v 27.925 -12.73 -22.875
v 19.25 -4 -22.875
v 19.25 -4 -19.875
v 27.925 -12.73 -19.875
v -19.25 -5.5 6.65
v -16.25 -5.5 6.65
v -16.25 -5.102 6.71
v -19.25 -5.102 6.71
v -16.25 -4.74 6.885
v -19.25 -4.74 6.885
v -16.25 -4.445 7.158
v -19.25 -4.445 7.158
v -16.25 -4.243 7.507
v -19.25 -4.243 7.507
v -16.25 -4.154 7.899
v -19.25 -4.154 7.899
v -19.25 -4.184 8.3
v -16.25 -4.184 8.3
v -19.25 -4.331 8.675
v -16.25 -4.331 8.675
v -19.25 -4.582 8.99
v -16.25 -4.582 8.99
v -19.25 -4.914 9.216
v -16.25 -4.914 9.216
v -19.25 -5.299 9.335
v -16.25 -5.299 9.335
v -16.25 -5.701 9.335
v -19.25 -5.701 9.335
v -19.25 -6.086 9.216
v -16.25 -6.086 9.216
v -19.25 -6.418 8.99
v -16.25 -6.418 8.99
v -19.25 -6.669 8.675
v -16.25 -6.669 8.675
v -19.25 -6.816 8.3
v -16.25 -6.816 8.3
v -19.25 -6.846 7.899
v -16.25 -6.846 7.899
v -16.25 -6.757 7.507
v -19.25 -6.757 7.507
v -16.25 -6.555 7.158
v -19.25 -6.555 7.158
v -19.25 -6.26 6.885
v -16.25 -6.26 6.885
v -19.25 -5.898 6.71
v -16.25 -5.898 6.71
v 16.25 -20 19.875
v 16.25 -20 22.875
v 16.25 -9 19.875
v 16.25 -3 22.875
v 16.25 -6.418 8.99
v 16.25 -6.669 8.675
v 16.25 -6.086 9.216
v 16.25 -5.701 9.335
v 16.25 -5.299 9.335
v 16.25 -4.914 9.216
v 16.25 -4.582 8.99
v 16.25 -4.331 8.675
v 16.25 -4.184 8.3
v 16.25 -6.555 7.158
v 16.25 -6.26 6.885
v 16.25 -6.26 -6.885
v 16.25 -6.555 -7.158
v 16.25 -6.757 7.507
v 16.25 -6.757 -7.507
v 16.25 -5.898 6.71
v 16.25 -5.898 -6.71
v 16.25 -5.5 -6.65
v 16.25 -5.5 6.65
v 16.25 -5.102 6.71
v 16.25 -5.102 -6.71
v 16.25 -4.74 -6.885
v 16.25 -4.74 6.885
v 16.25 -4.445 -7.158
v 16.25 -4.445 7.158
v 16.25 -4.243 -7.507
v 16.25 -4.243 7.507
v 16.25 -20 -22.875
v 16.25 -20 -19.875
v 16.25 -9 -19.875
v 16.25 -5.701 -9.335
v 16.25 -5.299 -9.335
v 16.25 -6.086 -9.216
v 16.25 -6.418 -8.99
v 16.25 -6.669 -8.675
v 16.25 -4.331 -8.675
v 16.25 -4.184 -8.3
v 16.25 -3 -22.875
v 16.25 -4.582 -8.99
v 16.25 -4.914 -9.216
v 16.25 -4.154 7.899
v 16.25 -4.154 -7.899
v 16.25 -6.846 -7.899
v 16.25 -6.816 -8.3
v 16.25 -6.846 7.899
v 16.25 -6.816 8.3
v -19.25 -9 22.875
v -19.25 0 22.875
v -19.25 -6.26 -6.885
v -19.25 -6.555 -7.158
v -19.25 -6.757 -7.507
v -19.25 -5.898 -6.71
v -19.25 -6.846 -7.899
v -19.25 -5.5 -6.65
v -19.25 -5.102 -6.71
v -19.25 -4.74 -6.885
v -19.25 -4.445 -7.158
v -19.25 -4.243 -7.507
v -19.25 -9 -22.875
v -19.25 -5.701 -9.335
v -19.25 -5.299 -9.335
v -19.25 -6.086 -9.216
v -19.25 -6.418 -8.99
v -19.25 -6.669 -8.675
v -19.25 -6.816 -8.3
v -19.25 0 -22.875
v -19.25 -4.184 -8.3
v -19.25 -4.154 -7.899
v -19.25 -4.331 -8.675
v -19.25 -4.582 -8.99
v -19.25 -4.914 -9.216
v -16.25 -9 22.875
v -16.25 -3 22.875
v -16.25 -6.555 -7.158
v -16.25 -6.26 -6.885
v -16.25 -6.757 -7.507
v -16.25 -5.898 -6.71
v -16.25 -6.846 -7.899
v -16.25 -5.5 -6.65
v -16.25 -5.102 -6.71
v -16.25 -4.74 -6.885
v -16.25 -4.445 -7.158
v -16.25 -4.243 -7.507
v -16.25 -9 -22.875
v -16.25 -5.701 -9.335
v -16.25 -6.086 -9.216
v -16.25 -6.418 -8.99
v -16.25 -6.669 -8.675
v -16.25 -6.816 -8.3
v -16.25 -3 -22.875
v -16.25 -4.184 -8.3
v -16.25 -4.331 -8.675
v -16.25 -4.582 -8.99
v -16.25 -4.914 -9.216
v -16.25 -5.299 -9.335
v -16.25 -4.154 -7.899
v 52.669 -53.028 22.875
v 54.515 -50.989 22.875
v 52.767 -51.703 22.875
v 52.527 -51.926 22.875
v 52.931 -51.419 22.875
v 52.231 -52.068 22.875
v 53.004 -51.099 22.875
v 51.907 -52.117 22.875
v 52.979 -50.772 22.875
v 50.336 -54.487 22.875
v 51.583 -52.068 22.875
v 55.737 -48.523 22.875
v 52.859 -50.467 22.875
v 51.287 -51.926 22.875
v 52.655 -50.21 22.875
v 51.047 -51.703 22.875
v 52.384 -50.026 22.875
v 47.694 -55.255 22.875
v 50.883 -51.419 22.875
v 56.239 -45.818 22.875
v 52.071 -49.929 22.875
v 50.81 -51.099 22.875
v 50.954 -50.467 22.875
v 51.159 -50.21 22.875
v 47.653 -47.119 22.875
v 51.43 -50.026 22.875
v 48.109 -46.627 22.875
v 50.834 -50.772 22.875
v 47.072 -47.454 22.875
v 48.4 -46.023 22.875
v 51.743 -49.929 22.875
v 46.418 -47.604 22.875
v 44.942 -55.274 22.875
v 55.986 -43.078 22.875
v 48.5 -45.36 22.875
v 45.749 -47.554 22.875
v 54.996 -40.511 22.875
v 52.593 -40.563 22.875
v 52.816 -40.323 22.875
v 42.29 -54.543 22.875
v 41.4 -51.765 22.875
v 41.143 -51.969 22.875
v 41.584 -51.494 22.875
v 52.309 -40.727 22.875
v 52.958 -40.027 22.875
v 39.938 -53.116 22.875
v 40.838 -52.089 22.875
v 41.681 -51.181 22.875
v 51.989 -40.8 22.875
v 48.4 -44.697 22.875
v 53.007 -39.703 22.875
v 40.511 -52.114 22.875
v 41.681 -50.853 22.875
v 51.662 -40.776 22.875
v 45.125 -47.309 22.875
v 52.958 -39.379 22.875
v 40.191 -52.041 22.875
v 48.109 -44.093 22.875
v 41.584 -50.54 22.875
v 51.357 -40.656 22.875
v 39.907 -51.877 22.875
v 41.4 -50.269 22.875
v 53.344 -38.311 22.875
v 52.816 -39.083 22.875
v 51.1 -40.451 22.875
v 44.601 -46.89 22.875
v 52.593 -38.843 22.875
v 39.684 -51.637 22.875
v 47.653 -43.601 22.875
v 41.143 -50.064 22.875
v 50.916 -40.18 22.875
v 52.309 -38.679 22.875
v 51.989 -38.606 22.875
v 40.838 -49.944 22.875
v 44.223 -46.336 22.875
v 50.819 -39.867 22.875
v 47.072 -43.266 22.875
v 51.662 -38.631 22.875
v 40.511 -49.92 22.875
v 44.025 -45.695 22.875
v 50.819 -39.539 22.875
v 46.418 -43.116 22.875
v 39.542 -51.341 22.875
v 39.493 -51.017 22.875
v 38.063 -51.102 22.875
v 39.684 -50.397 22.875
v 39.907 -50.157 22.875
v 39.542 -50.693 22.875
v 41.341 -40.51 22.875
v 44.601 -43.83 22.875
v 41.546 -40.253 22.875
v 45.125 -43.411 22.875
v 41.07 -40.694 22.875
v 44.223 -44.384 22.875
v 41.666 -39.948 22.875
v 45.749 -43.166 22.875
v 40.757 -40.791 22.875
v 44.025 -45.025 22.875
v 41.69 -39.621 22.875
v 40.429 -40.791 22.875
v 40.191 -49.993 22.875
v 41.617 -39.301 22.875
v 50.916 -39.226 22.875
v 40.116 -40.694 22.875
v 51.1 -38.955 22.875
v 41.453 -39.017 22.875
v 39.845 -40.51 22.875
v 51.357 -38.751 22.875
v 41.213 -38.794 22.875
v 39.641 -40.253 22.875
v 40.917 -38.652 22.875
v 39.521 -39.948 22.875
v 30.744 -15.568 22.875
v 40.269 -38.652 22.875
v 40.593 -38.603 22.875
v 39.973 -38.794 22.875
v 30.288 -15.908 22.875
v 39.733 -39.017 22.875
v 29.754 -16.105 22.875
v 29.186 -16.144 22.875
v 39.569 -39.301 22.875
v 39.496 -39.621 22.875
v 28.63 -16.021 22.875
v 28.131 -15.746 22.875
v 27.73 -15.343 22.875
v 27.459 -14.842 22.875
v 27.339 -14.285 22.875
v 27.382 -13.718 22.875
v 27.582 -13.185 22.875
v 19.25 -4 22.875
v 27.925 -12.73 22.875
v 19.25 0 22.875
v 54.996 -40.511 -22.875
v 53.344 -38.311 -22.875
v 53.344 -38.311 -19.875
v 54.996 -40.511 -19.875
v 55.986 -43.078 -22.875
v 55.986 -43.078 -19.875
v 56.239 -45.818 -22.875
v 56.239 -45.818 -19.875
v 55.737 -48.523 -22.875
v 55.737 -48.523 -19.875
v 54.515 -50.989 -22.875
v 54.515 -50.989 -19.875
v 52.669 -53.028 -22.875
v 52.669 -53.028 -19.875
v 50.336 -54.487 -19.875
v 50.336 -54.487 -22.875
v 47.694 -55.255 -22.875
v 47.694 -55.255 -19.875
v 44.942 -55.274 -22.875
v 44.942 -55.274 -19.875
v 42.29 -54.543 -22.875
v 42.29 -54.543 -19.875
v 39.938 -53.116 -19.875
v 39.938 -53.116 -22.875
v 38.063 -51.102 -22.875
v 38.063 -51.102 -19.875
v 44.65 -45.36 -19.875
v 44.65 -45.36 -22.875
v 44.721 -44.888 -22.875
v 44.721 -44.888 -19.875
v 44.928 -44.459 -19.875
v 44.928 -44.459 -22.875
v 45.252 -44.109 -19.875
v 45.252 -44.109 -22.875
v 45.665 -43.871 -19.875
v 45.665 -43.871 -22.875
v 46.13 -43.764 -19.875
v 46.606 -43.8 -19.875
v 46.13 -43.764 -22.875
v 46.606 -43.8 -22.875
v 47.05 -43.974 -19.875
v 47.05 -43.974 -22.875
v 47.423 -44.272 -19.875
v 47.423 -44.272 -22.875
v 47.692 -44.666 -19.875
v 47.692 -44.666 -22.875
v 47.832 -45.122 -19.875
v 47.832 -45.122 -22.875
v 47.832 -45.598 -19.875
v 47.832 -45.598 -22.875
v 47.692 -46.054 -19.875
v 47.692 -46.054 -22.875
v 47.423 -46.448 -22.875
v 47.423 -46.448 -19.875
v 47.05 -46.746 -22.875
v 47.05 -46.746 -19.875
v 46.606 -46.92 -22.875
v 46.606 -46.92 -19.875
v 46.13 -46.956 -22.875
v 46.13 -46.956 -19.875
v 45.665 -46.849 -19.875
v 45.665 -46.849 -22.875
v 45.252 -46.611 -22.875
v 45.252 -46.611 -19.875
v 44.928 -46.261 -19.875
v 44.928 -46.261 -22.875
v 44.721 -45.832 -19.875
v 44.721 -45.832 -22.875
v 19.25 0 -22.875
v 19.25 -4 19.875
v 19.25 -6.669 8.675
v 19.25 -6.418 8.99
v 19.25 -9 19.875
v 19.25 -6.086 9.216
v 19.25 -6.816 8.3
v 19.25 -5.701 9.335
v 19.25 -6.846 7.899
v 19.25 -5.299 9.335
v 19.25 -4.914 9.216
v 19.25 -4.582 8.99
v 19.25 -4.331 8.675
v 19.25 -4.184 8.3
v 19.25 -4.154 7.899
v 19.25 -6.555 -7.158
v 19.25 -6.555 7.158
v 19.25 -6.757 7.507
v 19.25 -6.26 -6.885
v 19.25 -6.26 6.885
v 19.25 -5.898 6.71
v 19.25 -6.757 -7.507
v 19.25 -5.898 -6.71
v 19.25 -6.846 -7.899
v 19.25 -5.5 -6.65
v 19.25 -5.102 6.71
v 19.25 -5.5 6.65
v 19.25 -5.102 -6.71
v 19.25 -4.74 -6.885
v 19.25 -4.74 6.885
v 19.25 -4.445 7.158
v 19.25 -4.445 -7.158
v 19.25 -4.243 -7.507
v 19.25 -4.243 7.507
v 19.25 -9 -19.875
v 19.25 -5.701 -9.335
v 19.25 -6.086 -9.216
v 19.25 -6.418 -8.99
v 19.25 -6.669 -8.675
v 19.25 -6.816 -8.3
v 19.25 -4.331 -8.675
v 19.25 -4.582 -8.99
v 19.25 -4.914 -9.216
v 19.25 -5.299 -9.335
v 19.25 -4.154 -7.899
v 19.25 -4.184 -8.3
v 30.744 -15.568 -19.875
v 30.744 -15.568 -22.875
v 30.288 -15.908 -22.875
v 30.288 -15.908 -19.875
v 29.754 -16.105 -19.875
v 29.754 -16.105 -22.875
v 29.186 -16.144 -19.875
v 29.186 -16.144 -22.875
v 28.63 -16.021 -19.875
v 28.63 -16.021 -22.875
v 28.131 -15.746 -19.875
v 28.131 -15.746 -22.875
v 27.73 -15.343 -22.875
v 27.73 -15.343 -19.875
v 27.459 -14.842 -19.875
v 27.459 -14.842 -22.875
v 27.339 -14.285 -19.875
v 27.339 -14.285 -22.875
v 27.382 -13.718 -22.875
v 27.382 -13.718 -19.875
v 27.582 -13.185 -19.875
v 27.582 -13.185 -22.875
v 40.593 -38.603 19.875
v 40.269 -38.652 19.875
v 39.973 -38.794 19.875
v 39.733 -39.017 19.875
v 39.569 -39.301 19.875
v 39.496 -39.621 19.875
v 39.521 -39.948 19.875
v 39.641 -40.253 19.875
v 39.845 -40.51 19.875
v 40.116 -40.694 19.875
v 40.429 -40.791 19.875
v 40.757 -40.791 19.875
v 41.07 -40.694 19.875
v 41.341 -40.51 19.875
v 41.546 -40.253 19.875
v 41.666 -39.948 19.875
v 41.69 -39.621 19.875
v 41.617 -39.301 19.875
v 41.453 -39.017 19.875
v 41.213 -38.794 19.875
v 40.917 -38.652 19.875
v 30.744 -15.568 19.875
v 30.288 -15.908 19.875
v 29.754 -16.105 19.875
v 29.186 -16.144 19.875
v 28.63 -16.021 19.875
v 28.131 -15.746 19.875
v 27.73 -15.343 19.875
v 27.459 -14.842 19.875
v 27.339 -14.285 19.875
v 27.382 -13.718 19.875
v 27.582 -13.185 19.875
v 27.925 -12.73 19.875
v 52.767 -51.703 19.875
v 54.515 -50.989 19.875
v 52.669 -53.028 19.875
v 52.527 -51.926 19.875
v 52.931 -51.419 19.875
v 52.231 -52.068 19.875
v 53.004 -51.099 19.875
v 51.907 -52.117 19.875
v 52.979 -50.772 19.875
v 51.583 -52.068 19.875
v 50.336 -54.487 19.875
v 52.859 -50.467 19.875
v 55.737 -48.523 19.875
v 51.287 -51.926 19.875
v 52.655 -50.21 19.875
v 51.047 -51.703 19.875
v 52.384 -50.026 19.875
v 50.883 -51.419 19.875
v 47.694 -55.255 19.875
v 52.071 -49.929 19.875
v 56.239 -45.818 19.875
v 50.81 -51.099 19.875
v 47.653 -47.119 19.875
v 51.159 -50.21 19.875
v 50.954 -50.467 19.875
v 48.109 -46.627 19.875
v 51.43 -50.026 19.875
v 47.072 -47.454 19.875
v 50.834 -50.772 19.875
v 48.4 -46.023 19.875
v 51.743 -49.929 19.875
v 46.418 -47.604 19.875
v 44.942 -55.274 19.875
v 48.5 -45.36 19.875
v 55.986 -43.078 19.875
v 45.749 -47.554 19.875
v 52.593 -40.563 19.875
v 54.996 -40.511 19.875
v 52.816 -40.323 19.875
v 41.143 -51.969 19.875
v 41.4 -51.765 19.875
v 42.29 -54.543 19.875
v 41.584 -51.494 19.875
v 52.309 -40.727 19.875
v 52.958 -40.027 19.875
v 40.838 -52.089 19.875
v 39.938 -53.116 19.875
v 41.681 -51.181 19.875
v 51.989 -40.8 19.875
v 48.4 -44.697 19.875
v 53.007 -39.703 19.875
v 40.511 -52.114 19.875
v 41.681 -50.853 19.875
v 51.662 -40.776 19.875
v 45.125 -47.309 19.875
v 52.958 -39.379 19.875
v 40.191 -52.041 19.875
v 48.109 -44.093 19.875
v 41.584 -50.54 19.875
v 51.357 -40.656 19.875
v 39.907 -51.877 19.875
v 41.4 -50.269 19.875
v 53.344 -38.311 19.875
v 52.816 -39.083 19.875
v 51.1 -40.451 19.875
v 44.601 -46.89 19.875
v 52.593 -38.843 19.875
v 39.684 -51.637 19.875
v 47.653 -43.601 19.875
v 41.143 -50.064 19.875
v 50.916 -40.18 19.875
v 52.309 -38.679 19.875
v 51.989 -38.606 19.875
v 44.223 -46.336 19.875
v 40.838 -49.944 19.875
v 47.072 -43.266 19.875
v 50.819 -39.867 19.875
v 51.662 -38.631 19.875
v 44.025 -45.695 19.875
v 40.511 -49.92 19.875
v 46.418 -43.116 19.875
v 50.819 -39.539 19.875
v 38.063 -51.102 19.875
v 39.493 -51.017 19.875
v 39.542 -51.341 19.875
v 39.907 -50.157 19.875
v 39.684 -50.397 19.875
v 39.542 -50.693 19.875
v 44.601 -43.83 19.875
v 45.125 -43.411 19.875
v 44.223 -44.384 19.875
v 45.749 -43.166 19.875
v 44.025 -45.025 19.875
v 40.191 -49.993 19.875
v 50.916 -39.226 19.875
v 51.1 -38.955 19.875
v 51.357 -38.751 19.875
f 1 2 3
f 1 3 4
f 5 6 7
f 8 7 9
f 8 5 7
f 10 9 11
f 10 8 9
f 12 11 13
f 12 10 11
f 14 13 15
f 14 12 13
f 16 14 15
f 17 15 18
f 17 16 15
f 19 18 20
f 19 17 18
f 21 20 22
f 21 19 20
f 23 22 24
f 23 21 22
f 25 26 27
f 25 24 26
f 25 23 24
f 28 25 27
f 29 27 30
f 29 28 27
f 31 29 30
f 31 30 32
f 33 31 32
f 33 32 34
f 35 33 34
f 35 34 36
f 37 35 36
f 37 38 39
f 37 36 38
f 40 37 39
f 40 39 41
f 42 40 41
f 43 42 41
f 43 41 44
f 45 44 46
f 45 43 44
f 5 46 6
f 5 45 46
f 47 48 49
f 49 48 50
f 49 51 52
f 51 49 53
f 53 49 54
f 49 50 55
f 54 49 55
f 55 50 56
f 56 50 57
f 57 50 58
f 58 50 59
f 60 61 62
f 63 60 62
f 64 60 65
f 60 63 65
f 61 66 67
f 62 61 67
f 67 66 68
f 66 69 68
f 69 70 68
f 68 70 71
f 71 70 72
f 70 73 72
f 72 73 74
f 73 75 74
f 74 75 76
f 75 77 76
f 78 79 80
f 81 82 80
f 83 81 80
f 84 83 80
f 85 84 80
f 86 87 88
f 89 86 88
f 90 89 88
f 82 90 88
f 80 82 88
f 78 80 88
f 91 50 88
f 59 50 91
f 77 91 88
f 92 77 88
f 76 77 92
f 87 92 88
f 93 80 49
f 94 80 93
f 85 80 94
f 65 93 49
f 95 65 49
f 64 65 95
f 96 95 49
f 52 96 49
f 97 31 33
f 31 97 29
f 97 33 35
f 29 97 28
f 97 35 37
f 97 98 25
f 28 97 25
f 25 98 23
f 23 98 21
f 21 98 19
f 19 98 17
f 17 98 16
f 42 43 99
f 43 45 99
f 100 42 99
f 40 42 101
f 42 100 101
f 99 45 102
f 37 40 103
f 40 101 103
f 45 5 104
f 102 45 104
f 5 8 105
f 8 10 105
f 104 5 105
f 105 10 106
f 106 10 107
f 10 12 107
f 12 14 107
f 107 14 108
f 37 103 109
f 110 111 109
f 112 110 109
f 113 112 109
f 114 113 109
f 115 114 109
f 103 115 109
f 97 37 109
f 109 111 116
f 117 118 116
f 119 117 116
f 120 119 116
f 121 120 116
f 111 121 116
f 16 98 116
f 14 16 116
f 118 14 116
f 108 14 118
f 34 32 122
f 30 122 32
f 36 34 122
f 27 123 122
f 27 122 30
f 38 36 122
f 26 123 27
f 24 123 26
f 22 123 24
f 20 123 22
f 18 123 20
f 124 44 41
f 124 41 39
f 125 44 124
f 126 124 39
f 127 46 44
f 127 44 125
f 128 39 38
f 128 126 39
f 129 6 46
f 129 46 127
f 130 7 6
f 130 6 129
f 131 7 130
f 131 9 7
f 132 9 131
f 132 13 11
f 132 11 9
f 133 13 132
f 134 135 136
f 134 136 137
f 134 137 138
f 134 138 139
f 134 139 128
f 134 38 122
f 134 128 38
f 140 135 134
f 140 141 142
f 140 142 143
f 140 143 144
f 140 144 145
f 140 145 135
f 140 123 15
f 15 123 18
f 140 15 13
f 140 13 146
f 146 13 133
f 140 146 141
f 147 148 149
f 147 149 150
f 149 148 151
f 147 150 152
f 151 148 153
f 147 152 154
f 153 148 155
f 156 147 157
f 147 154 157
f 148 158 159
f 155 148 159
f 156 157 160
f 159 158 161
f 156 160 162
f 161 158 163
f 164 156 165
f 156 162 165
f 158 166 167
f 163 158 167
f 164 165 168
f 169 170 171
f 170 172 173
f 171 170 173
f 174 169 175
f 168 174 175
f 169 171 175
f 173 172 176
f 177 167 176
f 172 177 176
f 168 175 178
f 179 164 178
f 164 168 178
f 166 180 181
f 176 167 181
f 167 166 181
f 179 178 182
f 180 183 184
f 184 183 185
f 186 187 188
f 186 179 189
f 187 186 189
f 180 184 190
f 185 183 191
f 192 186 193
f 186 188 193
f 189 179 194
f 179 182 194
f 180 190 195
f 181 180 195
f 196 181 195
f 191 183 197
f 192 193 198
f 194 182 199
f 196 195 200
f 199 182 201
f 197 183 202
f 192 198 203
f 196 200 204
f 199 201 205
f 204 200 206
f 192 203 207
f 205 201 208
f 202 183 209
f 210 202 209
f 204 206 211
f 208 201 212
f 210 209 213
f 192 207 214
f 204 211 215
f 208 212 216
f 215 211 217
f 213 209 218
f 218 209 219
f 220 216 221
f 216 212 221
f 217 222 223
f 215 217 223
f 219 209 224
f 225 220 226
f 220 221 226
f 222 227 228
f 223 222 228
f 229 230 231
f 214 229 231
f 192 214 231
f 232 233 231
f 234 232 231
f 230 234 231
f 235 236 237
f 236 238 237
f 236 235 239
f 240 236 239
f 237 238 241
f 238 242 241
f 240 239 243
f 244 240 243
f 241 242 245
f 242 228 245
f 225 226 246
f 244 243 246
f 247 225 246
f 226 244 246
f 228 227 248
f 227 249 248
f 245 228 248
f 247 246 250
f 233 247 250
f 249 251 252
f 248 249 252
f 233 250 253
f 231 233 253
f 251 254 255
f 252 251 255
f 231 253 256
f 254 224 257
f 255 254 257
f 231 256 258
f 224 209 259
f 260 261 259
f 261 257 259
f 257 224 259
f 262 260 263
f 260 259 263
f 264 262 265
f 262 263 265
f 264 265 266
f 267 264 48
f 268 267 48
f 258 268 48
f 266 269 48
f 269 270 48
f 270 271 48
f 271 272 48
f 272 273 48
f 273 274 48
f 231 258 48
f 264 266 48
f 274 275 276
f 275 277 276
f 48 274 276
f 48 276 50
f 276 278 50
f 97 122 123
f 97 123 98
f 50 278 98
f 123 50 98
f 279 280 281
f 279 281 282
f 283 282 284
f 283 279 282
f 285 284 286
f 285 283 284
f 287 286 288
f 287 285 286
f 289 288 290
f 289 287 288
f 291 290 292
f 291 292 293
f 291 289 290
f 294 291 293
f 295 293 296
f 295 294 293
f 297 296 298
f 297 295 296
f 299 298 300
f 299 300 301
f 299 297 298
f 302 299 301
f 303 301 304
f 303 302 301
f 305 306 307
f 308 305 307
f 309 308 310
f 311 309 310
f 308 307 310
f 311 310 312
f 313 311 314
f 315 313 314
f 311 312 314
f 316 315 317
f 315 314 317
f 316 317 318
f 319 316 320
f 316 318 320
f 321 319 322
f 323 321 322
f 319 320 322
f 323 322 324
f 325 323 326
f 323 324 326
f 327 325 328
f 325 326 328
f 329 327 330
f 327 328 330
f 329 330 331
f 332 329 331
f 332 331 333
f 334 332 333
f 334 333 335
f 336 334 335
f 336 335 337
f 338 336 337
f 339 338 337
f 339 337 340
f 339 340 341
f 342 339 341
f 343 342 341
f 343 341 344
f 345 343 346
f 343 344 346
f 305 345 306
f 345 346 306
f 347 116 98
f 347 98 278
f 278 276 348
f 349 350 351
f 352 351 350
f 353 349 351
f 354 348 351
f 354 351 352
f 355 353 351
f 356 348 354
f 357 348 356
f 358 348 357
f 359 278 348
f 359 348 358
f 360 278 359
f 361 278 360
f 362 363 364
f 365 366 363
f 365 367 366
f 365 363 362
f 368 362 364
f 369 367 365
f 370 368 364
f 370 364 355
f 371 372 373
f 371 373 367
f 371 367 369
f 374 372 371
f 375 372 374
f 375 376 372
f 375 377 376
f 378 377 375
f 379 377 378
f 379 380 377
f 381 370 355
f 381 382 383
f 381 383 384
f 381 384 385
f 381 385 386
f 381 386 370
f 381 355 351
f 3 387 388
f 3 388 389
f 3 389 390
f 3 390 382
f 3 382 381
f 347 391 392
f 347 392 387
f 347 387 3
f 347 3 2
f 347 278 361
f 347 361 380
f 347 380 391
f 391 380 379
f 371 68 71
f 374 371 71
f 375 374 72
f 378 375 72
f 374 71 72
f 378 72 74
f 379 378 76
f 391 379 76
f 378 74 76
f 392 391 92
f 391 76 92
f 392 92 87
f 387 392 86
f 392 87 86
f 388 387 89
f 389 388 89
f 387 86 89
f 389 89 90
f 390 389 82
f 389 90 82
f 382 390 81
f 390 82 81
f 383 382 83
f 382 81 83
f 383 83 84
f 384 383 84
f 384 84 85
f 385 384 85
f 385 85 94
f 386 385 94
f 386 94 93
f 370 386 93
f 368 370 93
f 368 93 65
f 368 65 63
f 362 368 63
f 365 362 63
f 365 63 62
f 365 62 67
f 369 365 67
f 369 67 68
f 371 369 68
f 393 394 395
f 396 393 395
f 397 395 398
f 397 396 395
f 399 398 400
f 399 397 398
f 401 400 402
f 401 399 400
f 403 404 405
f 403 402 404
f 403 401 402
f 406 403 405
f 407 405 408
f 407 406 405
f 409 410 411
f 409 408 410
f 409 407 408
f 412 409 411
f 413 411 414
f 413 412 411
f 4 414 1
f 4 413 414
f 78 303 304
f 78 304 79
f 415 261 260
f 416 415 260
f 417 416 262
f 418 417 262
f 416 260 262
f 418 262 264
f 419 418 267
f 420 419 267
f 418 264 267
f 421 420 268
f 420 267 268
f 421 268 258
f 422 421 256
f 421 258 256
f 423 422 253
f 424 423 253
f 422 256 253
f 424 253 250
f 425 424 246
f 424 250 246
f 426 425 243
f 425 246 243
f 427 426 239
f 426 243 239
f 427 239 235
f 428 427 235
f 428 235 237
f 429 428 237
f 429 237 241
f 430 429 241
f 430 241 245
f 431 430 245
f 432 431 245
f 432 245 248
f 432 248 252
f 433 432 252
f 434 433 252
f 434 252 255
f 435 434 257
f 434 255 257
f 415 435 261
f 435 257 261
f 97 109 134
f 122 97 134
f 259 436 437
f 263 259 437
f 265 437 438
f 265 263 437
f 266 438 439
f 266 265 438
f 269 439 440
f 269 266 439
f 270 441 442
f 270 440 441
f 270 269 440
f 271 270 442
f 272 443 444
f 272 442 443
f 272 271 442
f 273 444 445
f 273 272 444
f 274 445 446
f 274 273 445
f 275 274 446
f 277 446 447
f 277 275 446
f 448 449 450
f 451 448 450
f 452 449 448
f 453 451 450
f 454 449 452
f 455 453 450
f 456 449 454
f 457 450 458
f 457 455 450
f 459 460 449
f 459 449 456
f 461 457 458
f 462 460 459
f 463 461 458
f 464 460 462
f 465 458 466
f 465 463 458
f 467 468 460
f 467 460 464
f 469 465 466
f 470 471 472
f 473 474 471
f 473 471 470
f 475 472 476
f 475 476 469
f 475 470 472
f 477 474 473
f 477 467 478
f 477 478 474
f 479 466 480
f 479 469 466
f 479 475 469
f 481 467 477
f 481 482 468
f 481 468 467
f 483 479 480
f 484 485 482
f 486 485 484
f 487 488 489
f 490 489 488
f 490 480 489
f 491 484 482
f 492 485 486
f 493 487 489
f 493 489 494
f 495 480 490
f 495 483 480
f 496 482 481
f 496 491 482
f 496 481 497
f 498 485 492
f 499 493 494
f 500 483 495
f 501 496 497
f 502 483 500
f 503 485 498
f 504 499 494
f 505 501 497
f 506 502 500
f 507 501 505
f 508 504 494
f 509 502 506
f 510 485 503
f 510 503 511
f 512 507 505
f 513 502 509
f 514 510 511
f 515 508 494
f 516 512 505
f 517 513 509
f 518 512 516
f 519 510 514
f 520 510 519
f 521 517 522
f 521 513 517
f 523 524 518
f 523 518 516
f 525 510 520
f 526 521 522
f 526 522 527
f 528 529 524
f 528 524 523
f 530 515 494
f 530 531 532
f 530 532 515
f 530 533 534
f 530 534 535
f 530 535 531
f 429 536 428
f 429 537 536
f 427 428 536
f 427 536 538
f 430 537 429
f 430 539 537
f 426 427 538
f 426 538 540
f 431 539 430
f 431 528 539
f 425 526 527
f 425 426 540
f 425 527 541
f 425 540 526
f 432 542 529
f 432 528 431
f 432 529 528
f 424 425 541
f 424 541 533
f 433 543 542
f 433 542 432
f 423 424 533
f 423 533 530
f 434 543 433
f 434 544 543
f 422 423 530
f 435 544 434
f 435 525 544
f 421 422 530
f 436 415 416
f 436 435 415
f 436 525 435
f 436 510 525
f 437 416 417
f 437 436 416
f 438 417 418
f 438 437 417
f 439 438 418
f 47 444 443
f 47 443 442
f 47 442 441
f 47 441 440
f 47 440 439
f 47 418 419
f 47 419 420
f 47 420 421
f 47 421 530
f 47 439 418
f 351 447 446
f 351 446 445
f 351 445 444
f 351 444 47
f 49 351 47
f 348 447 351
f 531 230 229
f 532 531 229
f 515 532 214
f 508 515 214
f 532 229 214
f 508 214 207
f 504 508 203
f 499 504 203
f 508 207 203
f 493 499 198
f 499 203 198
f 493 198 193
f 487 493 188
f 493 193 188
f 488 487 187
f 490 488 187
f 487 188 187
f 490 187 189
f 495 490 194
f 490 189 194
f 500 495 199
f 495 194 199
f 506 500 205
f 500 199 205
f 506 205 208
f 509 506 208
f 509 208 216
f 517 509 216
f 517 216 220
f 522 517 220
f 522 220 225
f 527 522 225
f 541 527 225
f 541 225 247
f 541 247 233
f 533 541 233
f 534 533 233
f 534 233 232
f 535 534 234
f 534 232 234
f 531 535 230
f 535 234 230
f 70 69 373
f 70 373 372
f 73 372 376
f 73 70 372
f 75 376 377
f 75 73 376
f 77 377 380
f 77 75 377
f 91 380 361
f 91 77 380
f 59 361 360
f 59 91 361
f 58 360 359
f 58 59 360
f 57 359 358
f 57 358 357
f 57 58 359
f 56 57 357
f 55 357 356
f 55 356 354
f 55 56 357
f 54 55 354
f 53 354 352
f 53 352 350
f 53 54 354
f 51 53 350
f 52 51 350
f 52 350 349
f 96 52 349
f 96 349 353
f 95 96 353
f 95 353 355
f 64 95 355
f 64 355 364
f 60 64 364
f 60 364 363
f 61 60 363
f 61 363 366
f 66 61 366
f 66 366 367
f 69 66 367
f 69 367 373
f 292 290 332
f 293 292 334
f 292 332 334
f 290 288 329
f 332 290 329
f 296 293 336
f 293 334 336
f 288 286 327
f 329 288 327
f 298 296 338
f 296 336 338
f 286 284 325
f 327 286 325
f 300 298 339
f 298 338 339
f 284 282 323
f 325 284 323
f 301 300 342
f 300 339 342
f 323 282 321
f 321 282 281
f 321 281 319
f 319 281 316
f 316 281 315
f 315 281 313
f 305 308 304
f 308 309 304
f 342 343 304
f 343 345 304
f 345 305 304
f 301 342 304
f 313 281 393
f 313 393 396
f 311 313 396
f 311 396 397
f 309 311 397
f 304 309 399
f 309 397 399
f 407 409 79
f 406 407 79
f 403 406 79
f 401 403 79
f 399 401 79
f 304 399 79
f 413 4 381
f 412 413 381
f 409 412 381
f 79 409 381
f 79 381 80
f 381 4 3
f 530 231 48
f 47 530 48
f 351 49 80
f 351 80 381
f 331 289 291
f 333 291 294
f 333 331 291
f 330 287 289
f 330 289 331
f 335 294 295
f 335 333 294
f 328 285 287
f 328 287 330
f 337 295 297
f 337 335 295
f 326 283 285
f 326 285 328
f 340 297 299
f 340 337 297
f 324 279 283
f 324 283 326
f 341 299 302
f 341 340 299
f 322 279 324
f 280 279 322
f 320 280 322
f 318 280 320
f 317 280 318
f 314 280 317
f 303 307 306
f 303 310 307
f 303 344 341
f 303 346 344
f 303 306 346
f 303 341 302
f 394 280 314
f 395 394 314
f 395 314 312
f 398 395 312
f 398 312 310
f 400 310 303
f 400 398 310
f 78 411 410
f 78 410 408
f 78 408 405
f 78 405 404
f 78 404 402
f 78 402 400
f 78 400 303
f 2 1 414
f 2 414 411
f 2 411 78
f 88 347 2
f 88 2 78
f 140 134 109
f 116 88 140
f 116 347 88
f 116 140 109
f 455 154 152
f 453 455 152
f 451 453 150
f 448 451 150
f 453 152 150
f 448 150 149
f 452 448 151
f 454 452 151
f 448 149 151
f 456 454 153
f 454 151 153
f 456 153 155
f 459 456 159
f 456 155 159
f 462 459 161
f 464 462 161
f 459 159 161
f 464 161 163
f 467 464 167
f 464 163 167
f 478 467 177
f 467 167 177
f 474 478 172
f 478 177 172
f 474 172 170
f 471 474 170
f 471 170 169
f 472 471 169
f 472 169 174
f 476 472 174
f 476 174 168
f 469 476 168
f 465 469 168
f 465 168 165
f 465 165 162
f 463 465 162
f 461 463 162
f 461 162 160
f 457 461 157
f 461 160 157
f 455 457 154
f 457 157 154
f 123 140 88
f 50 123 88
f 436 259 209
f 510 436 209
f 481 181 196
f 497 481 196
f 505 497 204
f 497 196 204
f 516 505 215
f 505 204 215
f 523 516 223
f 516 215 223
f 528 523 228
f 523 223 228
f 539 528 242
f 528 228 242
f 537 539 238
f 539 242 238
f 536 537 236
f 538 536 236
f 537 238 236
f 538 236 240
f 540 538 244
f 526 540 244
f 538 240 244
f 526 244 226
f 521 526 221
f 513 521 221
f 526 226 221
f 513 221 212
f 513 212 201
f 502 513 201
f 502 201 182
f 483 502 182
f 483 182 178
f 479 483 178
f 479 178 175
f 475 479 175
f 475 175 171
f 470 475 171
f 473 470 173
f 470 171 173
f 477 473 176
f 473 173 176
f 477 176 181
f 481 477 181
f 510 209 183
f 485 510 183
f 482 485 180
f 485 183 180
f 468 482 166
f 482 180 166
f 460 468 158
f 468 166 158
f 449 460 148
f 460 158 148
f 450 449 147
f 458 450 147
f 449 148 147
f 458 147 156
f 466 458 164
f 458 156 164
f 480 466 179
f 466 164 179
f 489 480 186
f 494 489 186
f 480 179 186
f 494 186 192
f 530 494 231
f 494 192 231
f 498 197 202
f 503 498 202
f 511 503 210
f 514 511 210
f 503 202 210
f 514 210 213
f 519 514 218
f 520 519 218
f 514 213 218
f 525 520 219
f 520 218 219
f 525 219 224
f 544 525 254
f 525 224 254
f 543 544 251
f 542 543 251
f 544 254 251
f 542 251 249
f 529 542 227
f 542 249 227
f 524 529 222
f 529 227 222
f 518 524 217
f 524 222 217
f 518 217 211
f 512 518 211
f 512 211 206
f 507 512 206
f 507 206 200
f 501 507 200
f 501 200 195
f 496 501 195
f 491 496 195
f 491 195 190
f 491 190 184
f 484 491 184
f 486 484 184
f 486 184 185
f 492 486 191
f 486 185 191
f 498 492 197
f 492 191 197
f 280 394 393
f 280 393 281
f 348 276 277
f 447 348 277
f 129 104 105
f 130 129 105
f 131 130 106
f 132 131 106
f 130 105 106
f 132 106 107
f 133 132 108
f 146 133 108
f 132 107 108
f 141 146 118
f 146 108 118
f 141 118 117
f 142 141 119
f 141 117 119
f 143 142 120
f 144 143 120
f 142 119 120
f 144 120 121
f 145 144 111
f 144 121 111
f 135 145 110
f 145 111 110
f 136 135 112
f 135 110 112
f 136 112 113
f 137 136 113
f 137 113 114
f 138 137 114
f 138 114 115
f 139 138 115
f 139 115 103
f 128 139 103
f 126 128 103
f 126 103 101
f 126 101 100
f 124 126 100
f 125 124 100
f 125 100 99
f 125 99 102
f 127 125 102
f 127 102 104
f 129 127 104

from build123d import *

# Parameters (mm, degrees)
BOSS_EXTRUDE1_DEPTH = 3
SKETCH1_3_W         = 3
SKETCH1_3_H         = 45.75
SKETCH1_3_H_2       = 39.75
BOSS_EXTRUDE2_DEPTH = 9
SKETCH1_4_W         = 3
SKETCH1_4_H         = 45.75
BOSS_EXTRUDE3_DEPTH = 6
CUT_EXTRUDE1_REACH  = 47.678
SKETCH3_R           = 1.35
SKETCH1_5_W         = 3
SKETCH1_5_H         = 3
BOSS_EXTRUDE4_DEPTH = 20
BOSS_EXTRUDE5_DEPTH = 3
SKETCH5_R           = 2.25
SKETCH5_R_2         = 1.1
CUT_EXTRUDE2_DEPTH  = 3
SKETCH6_R           = 1.6
CUT_EXTRUDE3_DEPTH  = 3
CIRPATTERN1_COUNT   = 4
CUT_EXTRUDE4_REACH  = 93.224


with BuildPart() as part:
    # Sketch1 → Boss-Extrude1 (new body)
    with BuildSketch(Plane(origin=(0, 0, 0), x_dir=(1, 0, 0), z_dir=(0, 1, 0))):
        Polygon((16.25, 22.875), (-16.25, 22.875), (-16.25, -22.875), (16.25, -22.875), (16.25, -19.875), (16.25, 19.875), align=None)
    extrude(amount=-BOSS_EXTRUDE1_DEPTH)

    # Sketch1<3> → Boss-Extrude2 (add)
    with BuildSketch(Plane(origin=(0, 0, 0), x_dir=(1, 0, 0), z_dir=(0, 1, 0))):
        with Locations((-17.75, 0)):
            Rectangle(SKETCH1_3_W, SKETCH1_3_H)
        with Locations((17.75, 0)):
            Rectangle(SKETCH1_3_W, SKETCH1_3_H_2)
    extrude(amount=-BOSS_EXTRUDE2_DEPTH)

    # Sketch1<4> → Boss-Extrude3 (add)
    with BuildSketch(Plane(origin=(0, 0, 0), x_dir=(1, 0, 0), z_dir=(0, 1, 0))):
        with Locations((-17.75, 0)):
            Rectangle(SKETCH1_4_W, SKETCH1_4_H)
    extrude(amount=-BOSS_EXTRUDE3_DEPTH)

    # Cut-Extrude1: up to this face of the body (flat: up to its plane)
    cut_extrude1_end = Plane(part.part.faces().sort_by_distance((19.25, -4.5, 0))[0])
    # Sketch3 → Cut-Extrude1 (cut, up to the picked face)
    with BuildSketch(Plane.ZY.offset(19.25), mode=Mode.PRIVATE) as cut_extrude1_sk1:
        with Locations((-8, -5.5)):
            Circle(SKETCH3_R)
    cut_extrude1_tool1 = split(extrude(cut_extrude1_sk1.sketch, amount=-CUT_EXTRUDE1_REACH, mode=Mode.PRIVATE), bisect_by=cut_extrude1_end, keep=Keep.BOTH, mode=Mode.PRIVATE)
    cut_extrude1 = cut_extrude1_tool1.solids().sort_by(Axis((-19.25, -5.5, -8), (1, 0, 0)))[0]
    add(cut_extrude1, mode=Mode.SUBTRACT)

    # Mirror1: Cut-Extrude1 across plane
    add(cut_extrude1.mirror(Plane.XY), mode=Mode.SUBTRACT)

    # Sketch1<5> → Boss-Extrude4 (add)
    with BuildSketch(Plane(origin=(0, 0, 0), x_dir=(1, 0, 0), z_dir=(0, 1, 0))):
        with Locations((17.75, 21.375)):
            Rectangle(SKETCH1_5_W, SKETCH1_5_H)
        with Locations((17.75, -21.375)):
            Rectangle(SKETCH1_5_W, SKETCH1_5_H)
    extrude(amount=-BOSS_EXTRUDE4_DEPTH)

    # Sketch4 → Boss-Extrude5 (add)
    with BuildSketch(Plane.XY.offset(22.875)):
        with BuildLine():
            Line((19.25, -4), (53.343559989, -38.311496139))
            ThreePointArc((53.343559989, -38.311496139), (52.66855868, -53.028253026), (38.062810036, -51.101943964))
            Line((38.062810036, -51.101943964), (16.25, -20))
            Line((16.25, -20), (19.25, -4))
        make_face()
    boss_extrude5 = extrude(amount=-BOSS_EXTRUDE5_DEPTH)

    # Mirror2: Boss-Extrude5 across plane
    add(boss_extrude5.mirror(Plane.XY))

    # Sketch5 → Cut-Extrude2 (cut)
    with BuildSketch(Plane.XY.offset(22.875)):
        with Locations((46.25, -45.36)):
            Circle(SKETCH5_R)
        with Locations((51.906854249, -39.703145751)):
            Circle(SKETCH5_R_2)
    cut_extrude2 = extrude(amount=-CUT_EXTRUDE2_DEPTH, mode=Mode.SUBTRACT)

    # Sketch6 → Cut-Extrude3 (cut)
    with BuildSketch(Plane(origin=(0, 0, -22.875), x_dir=(-1, 0, 0), z_dir=(0, 0, -1))):
        with Locations((-46.25, -45.36)):
            Circle(SKETCH6_R)
    extrude(amount=-CUT_EXTRUDE3_DEPTH, mode=Mode.SUBTRACT)

    # CirPattern1: Cut-Extrude2 ×4 about axis
    cirpattern1_axis = Axis((46.25, -45.36, 0), (0, 0, 1))
    for i in range(1, CIRPATTERN1_COUNT):
        add(cut_extrude2.rotate(cirpattern1_axis, i * 360 / CIRPATTERN1_COUNT), mode=Mode.SUBTRACT)

    # Cut-Extrude4: up to this face of the body (flat: up to its plane)
    cut_extrude4_end = Plane(part.part.faces().sort_by_distance((30.534092, -28.25383722, -22.875))[0])
    # Sketch7 → Cut-Extrude4 (cut, up to the picked face)
    with BuildSketch(Plane.XY.offset(22.875), mode=Mode.PRIVATE) as cut_extrude4_sk1:
        with BuildLine():
            Line((27.924933355, -12.730386103), (30.7443349, -15.567810098))
            ThreePointArc((30.7443349, -15.567810098), (27.915922129, -15.558798873), (27.924933355, -12.730386103))
        make_face()
    cut_extrude4_tool1 = split(extrude(cut_extrude4_sk1.sketch, amount=-CUT_EXTRUDE4_REACH, mode=Mode.PRIVATE), bisect_by=cut_extrude4_end, keep=Keep.BOTH, mode=Mode.PRIVATE)
    add(cut_extrude4_tool1.solids().sort_by(Axis((28.732514, -14.747394, 22.875), (0, 0, -1)))[0], mode=Mode.SUBTRACT)


solid = part.part
